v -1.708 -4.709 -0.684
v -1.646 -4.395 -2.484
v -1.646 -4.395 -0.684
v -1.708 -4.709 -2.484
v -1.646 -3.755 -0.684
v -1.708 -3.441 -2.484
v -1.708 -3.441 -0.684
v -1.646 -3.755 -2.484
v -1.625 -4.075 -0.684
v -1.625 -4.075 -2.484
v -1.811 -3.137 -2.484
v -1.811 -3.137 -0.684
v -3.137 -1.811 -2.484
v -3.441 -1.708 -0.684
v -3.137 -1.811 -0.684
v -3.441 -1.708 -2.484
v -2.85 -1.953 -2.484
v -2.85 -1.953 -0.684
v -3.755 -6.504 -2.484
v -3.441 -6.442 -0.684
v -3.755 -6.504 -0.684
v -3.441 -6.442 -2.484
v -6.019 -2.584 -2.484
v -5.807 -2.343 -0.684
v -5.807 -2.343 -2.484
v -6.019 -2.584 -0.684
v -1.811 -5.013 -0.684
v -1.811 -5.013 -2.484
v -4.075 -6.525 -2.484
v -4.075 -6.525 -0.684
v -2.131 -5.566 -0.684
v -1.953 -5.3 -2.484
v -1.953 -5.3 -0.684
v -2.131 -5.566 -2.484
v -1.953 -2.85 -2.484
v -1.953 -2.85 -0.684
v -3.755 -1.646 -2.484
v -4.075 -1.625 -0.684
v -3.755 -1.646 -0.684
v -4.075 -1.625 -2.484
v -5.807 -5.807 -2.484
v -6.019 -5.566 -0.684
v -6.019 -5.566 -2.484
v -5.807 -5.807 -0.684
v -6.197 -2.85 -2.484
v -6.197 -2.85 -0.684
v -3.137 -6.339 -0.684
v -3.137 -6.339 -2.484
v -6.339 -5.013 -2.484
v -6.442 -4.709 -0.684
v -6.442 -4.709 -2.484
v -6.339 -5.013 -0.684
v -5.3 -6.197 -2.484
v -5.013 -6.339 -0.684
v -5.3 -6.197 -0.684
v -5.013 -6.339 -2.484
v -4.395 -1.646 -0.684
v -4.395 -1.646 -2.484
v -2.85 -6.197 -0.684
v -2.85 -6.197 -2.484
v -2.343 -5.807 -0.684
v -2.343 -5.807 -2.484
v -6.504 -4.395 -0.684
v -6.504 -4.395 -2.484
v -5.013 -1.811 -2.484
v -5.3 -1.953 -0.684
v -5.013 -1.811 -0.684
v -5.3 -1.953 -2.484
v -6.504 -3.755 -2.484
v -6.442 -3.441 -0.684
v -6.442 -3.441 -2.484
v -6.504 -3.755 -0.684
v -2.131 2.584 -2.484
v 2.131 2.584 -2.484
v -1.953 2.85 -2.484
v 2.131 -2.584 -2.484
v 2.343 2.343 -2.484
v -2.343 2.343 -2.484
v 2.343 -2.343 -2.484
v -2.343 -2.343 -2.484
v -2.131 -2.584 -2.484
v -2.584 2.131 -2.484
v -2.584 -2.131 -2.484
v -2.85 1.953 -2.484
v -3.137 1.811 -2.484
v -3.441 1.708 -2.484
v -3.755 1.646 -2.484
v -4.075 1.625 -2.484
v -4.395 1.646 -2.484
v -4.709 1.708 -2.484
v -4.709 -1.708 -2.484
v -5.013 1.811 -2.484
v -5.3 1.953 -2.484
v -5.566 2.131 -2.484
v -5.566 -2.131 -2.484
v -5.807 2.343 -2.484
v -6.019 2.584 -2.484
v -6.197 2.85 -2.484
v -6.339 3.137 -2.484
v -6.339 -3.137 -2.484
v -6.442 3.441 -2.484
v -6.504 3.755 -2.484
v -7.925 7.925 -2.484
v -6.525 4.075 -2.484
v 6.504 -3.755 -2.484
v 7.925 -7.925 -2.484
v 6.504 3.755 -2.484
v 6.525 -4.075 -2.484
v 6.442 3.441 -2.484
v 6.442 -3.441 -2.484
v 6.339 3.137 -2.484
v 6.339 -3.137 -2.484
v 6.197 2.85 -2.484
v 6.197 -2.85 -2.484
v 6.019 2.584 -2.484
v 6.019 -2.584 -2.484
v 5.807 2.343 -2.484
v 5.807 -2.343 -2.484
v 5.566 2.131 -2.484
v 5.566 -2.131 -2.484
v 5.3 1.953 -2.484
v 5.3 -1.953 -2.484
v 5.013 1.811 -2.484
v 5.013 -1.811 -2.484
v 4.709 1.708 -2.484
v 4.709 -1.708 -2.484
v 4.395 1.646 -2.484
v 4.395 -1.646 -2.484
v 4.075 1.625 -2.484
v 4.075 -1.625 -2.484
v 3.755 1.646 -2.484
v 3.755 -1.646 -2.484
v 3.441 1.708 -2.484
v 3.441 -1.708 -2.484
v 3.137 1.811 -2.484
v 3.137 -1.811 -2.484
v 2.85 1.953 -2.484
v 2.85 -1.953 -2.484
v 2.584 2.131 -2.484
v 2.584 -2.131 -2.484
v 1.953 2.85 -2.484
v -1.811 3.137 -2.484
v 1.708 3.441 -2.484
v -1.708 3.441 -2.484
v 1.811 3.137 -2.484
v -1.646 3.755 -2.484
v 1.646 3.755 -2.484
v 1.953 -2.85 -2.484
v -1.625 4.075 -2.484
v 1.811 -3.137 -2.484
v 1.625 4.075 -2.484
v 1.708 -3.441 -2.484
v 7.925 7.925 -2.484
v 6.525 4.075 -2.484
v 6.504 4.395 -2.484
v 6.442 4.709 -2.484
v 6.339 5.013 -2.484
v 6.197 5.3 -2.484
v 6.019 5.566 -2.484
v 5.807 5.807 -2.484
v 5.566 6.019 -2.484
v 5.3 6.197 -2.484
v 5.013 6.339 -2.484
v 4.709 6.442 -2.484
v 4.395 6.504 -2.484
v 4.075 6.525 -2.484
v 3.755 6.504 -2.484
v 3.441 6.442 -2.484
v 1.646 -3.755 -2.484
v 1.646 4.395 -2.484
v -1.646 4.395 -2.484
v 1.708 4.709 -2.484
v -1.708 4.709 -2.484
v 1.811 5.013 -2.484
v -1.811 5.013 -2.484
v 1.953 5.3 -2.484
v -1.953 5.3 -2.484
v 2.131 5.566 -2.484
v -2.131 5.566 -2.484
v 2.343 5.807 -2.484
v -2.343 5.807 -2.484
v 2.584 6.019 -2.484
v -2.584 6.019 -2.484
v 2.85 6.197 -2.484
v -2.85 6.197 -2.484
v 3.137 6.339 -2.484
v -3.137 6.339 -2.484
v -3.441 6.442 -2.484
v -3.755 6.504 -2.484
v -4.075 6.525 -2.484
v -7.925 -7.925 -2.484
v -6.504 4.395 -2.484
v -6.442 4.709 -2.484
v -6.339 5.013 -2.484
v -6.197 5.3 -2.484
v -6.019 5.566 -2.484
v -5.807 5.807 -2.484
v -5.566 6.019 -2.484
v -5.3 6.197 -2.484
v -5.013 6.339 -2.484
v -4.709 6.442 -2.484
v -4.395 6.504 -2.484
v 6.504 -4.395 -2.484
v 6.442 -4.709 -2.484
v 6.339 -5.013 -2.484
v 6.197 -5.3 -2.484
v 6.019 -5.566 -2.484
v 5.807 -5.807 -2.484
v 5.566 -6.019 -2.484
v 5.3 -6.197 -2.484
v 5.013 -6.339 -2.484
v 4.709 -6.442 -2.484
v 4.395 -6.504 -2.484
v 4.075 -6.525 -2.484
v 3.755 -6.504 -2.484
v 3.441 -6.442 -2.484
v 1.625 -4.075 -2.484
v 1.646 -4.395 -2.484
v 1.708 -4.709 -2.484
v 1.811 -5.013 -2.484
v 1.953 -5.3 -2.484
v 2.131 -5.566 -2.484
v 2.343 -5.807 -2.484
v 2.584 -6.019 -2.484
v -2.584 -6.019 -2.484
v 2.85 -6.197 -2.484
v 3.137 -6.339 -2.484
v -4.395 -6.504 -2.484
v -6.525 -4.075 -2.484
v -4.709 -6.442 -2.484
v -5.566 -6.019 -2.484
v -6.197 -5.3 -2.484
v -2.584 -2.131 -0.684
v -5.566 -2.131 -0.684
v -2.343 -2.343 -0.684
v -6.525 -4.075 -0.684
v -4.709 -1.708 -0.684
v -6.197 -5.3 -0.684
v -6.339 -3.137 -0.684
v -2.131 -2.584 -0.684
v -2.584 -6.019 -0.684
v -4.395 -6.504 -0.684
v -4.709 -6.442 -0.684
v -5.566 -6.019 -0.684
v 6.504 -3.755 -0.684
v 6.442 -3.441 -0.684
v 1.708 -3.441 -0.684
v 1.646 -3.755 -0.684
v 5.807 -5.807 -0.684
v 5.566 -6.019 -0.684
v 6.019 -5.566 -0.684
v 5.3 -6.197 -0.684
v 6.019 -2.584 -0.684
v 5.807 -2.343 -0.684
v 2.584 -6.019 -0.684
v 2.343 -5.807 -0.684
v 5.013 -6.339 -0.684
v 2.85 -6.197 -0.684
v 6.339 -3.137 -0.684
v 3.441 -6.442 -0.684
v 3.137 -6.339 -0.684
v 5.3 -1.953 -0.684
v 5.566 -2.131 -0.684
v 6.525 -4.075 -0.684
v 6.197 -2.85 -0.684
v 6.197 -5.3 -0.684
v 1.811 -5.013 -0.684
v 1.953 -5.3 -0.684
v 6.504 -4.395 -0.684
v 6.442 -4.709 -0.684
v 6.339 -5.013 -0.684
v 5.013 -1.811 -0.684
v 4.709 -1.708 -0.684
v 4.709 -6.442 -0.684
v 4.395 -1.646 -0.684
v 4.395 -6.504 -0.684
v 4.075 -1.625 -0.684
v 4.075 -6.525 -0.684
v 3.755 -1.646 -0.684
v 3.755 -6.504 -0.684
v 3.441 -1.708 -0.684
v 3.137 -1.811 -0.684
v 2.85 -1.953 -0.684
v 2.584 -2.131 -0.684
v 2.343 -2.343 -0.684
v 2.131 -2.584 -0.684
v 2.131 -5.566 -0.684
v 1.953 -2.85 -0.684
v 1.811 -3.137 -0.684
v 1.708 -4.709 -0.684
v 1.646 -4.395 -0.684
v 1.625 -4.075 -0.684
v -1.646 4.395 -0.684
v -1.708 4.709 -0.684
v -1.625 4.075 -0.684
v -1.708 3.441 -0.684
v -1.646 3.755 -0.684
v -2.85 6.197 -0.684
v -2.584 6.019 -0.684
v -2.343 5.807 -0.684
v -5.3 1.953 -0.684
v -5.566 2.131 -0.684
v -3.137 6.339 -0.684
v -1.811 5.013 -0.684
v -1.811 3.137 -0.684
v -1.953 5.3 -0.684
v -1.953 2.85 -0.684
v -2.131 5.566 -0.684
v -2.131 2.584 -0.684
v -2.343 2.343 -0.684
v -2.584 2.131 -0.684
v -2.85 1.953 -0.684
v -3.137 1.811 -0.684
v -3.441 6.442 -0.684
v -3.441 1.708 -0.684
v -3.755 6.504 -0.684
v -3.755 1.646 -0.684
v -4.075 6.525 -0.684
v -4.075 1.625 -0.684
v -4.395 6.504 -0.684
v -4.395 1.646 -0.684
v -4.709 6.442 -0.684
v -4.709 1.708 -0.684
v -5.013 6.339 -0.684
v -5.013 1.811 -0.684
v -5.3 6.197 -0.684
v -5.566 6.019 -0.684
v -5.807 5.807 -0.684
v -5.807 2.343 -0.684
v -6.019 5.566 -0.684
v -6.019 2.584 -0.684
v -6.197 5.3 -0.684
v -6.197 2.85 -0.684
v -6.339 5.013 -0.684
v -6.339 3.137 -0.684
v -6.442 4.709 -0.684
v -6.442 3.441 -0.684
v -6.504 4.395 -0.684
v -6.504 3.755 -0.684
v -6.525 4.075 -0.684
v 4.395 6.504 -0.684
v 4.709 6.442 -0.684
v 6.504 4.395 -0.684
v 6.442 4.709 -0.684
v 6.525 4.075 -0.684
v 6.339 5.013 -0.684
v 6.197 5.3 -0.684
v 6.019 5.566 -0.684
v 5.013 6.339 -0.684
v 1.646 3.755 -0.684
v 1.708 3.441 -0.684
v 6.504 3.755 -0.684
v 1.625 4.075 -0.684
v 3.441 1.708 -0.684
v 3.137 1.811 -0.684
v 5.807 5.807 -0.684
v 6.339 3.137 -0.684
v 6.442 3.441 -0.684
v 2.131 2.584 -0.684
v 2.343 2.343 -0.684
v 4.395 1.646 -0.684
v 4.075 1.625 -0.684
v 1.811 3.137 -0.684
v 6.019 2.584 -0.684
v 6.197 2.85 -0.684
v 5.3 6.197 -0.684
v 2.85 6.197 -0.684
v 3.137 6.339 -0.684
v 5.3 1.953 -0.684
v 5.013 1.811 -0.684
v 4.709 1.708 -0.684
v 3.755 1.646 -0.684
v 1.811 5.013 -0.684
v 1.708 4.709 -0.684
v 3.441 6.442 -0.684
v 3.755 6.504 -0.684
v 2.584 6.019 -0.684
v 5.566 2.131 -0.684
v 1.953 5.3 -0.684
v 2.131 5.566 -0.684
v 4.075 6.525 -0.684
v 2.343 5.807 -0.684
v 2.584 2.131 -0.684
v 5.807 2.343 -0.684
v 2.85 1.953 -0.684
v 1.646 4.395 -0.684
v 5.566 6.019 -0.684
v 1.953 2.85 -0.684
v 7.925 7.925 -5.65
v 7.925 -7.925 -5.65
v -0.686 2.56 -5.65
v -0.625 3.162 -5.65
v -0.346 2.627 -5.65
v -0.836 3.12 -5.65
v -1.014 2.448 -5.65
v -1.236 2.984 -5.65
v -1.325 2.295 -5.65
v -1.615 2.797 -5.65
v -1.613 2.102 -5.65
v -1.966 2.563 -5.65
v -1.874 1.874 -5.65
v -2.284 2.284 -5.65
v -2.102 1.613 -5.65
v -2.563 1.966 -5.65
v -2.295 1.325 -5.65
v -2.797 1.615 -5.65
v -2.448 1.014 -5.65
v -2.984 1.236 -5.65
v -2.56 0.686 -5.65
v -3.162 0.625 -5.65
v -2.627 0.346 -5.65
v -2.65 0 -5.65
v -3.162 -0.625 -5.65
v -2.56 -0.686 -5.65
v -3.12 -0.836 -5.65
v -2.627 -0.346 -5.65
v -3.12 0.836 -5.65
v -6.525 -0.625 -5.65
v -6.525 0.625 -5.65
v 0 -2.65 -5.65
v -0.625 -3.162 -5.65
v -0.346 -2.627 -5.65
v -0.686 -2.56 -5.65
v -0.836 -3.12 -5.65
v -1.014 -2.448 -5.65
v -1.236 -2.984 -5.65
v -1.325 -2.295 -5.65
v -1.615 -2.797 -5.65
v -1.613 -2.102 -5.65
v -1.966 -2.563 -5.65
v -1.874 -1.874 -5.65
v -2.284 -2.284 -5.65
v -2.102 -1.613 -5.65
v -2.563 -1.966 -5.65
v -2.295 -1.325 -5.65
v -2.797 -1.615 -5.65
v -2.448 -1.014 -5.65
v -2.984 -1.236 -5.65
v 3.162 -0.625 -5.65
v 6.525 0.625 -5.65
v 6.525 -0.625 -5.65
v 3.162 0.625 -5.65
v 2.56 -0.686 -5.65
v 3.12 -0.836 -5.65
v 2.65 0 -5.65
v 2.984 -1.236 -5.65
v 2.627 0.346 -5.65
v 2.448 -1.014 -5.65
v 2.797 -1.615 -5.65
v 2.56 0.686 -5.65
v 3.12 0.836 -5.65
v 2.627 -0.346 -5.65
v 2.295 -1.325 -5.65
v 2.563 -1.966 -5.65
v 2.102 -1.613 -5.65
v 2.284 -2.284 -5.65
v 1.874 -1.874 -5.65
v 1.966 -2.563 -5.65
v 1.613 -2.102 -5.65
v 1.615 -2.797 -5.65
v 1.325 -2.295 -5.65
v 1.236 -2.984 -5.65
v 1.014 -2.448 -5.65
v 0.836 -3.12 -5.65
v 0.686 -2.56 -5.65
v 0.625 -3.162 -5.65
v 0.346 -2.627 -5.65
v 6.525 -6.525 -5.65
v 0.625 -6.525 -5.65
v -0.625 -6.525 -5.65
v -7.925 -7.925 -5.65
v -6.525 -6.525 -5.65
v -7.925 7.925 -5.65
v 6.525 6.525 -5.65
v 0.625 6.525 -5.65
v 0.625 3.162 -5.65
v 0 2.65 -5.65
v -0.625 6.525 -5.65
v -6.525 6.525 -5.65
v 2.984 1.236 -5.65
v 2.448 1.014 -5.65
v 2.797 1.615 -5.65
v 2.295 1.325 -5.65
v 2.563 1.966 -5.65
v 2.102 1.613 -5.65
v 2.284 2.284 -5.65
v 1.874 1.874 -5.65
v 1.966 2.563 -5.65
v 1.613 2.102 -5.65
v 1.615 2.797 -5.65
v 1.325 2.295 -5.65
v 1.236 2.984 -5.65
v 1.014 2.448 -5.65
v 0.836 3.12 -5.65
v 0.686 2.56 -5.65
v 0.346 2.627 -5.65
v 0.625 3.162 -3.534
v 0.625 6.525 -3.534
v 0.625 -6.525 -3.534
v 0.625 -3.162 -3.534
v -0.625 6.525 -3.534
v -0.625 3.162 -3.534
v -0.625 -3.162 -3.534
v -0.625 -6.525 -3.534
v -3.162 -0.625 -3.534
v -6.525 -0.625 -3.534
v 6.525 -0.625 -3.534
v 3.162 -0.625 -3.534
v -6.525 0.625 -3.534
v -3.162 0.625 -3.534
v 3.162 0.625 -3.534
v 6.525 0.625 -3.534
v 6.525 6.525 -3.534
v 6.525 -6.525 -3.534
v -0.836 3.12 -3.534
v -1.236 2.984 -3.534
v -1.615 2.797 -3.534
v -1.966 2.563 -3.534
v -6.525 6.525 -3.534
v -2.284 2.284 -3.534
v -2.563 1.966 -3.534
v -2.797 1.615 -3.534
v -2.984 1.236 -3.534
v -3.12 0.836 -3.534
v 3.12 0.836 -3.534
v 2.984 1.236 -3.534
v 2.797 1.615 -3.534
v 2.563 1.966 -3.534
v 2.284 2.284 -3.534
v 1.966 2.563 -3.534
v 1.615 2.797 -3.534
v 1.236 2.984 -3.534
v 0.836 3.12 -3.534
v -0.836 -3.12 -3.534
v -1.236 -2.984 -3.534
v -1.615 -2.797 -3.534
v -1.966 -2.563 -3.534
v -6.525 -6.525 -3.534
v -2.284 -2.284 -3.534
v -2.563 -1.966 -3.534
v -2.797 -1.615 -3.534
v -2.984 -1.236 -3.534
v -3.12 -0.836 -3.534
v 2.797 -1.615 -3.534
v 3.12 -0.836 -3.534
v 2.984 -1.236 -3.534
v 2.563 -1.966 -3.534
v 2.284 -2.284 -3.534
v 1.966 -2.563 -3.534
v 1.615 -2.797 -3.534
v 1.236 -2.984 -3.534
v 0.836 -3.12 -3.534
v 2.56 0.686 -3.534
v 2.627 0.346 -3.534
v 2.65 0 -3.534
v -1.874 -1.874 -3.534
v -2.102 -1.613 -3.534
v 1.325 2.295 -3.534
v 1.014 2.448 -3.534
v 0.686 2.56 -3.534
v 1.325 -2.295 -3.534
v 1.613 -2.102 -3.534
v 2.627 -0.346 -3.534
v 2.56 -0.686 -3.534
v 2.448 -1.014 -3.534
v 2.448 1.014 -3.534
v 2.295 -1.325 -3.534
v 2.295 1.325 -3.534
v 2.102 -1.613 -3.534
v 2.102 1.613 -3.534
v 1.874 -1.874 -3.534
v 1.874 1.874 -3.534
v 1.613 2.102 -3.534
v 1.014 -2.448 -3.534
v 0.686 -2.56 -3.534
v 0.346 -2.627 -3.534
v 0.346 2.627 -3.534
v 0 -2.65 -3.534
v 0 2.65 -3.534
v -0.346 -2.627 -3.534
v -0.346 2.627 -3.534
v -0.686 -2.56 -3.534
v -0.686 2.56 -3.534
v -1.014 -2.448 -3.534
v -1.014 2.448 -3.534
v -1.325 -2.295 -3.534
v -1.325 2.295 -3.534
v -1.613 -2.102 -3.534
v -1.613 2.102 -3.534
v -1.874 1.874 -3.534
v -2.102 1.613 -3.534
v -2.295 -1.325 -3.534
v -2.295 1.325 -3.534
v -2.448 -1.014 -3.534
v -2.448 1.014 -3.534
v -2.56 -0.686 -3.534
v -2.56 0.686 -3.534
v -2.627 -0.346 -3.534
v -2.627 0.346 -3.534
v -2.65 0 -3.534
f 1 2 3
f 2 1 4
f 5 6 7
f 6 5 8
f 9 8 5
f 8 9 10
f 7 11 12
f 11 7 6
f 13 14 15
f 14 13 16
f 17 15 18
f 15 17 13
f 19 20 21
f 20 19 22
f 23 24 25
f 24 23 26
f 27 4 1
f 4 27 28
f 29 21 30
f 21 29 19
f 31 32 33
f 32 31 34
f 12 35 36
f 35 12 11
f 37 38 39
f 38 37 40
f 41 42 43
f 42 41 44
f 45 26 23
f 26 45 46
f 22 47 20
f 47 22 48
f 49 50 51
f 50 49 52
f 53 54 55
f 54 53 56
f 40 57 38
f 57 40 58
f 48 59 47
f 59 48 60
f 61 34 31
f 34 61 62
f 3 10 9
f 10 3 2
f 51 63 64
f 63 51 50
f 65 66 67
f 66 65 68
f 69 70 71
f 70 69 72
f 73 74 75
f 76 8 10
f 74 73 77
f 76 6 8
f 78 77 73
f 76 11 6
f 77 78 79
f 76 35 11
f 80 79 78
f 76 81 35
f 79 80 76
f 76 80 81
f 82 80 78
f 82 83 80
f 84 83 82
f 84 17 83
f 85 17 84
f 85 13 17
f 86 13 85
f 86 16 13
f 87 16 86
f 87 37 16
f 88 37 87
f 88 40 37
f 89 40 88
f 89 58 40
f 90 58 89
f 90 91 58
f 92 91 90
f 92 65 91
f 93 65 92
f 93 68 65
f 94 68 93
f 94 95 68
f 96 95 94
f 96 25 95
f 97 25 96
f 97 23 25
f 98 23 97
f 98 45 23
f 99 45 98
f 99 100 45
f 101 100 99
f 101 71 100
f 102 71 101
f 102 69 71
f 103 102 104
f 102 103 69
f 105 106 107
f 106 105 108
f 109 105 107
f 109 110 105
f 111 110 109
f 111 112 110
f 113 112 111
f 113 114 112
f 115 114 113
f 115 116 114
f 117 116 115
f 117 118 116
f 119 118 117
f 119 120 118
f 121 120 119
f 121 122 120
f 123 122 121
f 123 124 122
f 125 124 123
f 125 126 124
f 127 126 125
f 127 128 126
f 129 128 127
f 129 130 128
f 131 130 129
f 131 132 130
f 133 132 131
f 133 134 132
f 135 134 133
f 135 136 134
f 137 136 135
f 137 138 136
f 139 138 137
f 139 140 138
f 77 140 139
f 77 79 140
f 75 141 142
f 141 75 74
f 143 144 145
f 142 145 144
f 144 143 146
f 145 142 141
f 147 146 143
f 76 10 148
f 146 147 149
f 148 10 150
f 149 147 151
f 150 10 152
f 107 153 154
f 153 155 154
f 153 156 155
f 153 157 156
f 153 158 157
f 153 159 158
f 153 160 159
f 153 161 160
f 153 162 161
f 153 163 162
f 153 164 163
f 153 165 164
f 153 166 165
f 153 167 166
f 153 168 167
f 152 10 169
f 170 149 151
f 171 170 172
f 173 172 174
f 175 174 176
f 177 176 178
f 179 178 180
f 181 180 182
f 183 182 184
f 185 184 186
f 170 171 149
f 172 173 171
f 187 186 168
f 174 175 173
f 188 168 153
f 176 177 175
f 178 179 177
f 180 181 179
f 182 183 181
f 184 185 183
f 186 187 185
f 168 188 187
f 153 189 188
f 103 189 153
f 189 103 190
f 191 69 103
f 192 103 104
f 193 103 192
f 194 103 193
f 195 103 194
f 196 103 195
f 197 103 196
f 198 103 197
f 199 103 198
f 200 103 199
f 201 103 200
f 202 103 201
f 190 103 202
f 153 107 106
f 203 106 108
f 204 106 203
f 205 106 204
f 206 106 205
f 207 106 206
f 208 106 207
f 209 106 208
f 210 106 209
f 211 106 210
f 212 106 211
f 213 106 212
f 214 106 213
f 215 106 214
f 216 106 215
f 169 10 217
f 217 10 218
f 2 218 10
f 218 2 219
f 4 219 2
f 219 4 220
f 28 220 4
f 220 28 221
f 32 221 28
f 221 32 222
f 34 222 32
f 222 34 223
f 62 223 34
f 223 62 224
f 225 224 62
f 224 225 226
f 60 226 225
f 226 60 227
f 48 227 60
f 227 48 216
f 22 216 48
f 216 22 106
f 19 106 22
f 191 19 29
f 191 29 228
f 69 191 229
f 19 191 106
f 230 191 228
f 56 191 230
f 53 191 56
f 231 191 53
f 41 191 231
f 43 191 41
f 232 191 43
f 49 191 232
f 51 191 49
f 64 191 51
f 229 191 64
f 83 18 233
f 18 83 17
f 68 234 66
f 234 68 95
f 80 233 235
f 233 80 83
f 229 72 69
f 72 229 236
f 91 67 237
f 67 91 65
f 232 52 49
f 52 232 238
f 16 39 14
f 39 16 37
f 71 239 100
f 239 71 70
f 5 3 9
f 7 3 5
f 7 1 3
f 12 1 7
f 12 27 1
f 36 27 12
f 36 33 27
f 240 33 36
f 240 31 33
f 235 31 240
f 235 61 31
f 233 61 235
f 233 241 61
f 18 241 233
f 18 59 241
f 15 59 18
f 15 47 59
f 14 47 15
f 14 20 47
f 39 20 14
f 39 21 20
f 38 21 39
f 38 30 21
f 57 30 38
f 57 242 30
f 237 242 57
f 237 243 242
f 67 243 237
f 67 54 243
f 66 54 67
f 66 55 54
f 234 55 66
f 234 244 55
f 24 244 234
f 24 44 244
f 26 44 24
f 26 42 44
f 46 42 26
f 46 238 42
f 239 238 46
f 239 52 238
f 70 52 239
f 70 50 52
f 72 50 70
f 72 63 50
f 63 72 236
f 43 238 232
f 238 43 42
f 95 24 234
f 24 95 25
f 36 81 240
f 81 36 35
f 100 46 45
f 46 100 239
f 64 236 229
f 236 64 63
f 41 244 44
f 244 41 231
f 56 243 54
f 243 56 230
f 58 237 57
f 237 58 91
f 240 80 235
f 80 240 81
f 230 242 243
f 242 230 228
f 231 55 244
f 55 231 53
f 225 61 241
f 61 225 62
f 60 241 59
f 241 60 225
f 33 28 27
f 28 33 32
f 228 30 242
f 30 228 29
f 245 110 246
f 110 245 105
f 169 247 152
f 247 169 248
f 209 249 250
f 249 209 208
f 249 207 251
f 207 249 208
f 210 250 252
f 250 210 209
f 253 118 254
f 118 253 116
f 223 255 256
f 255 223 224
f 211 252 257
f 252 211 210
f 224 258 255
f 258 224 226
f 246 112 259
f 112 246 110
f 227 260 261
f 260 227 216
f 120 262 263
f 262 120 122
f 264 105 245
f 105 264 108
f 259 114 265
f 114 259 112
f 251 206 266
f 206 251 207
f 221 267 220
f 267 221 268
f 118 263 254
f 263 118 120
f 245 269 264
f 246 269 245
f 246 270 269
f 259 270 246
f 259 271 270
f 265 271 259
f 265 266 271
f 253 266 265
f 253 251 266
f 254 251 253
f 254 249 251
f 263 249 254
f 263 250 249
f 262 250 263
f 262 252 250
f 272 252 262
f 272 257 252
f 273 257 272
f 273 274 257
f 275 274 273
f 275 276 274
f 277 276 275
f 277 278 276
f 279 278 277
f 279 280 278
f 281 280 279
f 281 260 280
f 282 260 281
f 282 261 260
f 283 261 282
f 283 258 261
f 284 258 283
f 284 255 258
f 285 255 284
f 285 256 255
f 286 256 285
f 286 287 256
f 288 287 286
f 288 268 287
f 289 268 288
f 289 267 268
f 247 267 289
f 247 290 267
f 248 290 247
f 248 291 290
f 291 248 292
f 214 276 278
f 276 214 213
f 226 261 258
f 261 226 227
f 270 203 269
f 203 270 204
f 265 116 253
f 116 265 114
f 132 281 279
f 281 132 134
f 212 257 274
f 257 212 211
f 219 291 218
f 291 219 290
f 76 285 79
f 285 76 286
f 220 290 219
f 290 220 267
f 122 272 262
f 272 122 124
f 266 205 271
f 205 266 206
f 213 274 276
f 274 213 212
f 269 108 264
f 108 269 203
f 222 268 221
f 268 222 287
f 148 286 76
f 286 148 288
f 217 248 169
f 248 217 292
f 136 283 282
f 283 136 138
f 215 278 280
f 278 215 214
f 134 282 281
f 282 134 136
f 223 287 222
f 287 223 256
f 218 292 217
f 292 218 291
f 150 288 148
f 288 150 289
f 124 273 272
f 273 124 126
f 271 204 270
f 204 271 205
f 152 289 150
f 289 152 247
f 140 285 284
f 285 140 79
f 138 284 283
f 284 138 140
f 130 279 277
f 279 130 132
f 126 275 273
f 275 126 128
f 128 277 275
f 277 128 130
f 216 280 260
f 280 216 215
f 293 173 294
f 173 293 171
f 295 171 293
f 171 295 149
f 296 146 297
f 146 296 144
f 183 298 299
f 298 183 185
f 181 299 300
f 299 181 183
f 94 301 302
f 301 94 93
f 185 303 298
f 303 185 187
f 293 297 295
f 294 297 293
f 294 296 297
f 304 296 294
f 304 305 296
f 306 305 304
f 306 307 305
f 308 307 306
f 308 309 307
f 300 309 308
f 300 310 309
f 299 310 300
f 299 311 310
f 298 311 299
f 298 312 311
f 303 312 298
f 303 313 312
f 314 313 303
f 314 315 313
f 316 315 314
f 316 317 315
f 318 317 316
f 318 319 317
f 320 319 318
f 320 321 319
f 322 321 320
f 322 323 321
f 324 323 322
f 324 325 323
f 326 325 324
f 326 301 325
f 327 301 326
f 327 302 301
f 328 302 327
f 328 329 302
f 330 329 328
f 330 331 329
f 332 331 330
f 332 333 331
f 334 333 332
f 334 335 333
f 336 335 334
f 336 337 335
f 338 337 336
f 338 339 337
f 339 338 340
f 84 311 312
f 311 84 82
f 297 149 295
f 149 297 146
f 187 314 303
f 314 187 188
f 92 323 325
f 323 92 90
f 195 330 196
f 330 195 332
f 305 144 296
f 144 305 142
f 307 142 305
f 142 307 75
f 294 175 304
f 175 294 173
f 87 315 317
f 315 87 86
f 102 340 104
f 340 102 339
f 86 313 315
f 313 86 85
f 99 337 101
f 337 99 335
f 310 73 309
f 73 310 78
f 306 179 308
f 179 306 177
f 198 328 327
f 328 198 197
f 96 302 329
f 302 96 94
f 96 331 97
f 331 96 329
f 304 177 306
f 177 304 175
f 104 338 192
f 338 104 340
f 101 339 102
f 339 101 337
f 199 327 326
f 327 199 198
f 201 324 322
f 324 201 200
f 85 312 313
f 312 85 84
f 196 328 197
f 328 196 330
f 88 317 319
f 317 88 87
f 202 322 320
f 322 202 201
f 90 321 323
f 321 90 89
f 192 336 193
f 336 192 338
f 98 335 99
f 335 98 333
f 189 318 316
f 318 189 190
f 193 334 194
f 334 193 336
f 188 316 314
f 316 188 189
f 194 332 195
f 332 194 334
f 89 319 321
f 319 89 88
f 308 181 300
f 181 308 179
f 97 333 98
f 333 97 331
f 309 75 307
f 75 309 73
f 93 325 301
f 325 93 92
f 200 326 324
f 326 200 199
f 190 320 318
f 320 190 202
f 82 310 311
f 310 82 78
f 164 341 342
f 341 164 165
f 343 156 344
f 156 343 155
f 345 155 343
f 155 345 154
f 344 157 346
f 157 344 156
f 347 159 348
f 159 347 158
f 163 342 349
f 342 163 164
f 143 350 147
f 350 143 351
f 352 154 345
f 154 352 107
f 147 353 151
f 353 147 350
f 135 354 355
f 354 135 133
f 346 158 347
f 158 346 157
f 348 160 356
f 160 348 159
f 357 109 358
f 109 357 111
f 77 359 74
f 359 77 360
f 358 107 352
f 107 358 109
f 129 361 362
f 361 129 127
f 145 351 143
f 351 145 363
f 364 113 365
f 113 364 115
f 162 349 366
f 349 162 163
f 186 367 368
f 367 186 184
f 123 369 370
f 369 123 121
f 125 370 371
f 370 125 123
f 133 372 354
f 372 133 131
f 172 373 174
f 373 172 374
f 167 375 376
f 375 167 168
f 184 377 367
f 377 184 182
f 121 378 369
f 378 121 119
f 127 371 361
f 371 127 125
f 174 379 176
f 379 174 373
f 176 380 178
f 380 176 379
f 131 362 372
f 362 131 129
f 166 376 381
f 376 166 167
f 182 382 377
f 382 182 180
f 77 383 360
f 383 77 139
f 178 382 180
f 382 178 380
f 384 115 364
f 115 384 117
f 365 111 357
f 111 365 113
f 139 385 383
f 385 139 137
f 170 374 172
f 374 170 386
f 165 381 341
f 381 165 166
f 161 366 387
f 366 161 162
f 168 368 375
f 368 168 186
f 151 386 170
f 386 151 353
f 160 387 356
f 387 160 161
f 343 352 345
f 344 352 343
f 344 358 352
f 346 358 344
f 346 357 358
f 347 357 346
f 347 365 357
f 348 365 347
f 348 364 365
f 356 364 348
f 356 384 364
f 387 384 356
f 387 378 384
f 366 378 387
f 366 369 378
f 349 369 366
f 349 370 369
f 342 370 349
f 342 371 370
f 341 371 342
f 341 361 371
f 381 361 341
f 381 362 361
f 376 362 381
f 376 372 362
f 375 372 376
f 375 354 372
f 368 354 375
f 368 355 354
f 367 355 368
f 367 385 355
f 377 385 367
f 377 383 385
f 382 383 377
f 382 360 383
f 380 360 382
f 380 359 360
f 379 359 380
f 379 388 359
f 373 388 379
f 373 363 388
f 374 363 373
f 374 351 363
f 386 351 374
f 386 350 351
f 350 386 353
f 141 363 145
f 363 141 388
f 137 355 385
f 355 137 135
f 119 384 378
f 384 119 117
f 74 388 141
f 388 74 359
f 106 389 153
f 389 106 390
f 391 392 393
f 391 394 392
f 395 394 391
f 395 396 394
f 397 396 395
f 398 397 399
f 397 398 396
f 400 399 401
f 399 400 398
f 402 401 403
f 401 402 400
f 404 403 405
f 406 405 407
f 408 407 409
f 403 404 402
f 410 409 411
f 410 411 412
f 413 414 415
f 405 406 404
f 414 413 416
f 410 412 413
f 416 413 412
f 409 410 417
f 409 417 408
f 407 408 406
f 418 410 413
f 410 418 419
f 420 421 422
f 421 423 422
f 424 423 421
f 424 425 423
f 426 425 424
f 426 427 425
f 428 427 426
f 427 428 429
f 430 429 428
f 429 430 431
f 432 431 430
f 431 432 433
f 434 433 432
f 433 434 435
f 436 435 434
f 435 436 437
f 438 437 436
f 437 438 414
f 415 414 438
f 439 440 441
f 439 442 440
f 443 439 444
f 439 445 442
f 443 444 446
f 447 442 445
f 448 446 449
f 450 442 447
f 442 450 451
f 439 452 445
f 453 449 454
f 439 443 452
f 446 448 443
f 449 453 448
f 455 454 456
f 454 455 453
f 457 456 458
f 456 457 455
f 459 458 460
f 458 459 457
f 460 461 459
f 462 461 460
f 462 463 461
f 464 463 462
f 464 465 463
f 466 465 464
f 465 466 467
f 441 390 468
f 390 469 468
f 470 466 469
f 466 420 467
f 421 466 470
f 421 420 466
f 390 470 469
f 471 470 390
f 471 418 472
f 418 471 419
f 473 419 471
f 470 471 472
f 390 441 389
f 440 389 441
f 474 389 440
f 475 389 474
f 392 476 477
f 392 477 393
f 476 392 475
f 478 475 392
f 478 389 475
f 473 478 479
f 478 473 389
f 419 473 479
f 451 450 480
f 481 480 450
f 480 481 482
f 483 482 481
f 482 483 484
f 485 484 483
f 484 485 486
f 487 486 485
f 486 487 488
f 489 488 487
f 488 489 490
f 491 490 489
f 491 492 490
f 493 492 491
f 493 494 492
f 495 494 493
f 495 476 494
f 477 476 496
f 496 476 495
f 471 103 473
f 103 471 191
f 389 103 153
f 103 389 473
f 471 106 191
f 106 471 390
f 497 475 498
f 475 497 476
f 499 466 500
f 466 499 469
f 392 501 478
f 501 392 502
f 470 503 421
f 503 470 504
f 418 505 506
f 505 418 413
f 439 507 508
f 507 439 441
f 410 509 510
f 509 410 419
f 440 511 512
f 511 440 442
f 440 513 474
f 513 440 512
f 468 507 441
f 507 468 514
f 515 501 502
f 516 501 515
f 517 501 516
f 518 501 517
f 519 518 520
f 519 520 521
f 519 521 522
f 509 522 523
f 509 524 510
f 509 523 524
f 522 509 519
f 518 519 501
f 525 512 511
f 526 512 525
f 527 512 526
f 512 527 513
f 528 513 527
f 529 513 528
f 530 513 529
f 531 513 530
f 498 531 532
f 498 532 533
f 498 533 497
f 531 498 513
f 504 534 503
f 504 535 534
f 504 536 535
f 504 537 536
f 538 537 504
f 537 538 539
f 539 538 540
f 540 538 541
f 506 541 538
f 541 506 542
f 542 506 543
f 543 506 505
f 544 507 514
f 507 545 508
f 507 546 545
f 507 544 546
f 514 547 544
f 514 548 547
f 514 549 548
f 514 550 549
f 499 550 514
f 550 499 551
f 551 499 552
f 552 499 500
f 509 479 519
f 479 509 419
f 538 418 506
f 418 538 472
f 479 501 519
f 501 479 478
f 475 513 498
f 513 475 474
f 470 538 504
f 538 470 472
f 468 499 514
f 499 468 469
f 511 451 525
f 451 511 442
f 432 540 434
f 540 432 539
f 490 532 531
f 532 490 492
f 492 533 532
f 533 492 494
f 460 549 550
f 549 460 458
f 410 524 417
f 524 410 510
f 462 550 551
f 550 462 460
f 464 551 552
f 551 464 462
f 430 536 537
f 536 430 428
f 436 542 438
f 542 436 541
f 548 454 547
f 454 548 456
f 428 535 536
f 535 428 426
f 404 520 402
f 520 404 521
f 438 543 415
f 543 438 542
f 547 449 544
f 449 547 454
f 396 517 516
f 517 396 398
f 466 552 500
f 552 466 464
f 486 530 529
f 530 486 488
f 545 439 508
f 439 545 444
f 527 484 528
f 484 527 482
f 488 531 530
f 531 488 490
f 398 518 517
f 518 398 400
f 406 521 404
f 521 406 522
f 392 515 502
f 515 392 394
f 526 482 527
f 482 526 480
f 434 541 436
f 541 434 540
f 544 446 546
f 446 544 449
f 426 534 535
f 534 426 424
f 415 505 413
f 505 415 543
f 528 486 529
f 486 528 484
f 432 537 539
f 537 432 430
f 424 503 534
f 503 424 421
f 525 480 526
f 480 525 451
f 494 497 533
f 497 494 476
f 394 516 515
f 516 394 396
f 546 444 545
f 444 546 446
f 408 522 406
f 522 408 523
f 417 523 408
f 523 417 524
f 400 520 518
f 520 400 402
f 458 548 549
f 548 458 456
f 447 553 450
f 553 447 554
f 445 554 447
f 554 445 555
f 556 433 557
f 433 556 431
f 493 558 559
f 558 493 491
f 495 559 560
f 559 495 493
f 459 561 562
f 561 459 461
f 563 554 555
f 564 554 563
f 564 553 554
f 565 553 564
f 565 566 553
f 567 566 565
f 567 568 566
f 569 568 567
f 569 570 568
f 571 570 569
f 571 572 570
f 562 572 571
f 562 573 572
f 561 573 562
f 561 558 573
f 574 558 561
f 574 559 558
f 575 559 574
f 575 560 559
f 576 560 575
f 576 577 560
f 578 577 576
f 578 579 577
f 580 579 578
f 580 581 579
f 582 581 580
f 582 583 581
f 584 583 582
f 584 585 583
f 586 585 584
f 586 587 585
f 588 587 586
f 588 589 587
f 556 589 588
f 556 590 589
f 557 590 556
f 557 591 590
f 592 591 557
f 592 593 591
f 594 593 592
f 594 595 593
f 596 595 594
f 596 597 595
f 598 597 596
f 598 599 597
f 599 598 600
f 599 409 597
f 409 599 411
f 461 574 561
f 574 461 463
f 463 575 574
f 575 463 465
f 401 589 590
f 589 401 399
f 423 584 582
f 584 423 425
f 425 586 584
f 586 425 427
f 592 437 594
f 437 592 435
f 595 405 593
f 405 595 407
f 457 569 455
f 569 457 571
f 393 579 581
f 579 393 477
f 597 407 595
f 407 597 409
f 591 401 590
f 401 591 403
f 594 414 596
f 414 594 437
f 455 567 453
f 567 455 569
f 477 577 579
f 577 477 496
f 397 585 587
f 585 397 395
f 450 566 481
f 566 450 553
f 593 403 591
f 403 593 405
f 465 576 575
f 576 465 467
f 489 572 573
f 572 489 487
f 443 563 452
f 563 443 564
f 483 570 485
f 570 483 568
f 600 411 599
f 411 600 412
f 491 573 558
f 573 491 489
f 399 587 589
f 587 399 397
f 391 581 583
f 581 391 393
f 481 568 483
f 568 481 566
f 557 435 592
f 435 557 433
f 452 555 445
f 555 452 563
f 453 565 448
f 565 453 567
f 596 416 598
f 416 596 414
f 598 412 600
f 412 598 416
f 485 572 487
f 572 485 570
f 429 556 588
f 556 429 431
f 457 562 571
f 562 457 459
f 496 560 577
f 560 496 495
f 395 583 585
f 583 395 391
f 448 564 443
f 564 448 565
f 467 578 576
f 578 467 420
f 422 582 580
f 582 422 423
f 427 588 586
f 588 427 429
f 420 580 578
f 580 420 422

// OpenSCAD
// file: lego.scad
// edited 2/24/11 3:29 PM

// Standard lego block height, from bottom to top, not counting the circular knobs on top
block_height=9.5;
block_smooth=0.8;

// Exterior thickness
wall_thickness=1.40; //1.45
roof_thickness=1.05;

// Knobs are the circles on top of blocks
knob_diameter=4.9; //4.8
knob_height=1.8;
knob_spacing=8.15; //8.0

// Pins are small cylinders inside blocks with width or length of 1 (visible from the bottom)
pin_diameter=3;

// Posts are the tubes inside blocks with width and length > 1 (visible from the bottom)
post_diameter=6.46; //6.46
post_fudge=0.2; // 0.05 Additional diameter for cylinder that makes the post hollow

// Width of reinforcement bars (visible from the bottom)
reinforcing_width=1.25;

// Axles are cross-shaped holes taken out of lego blocks
axle_spline_width=2.0;
axle_diameter=5;

// Cylinder precision affects both posts and pins
cylinder_precision=0.3;

// The "reinforcement" is the inner wall that goes from post to post, or post to outer wall
module reinforcement(overall_width,height) {
	translate([0,0,height*block_height/2])
		cube([reinforcing_width,overall_width,height*block_height],center=true);
}

// An "axle" is an optional cross-shaped hole that cuts through the lego block
module axle(height) {
	translate([0,0,height*block_height/2]) union() {
		cube([axle_diameter,axle_spline_width,height*block_height],center=true);
		cube([axle_spline_width,axle_diameter,height*block_height],center=true);
	}
}

module lego_knobs(width, length, centerx=0, centery=0, centerz=0) {
	overall_length=(length-1)*knob_spacing+knob_diameter+wall_thickness*2;
	overall_width=(width-1)*knob_spacing+knob_diameter+wall_thickness*2;
	translate([-overall_length/2*centerx, -overall_width/2*centery, -(block_height+knob_height)/2]) {
		translate([knob_diameter/2+wall_thickness,knob_diameter/2+wall_thickness,0]) {
			for (ycount=[0:width-1]) {
				for (xcount=[0:length-1]) {
					translate([xcount*knob_spacing,ycount*knob_spacing,0])
						cylinder(r=knob_diameter/2,h=knob_height,$fs=cylinder_precision);
				}
			}
		}
	}	
}

// The 'positive space' of a lego block
module lego_positive(width, length, height, reinforcement=true, centerx=0, centery=0, centerz=0) {
	overall_length=(length-1)*knob_spacing+knob_diameter+wall_thickness*2;
	overall_width=(width-1)*knob_spacing+knob_diameter+wall_thickness*2;
	translate([-overall_length/2*centerx, -overall_width/2*centery, -(block_height+knob_height)/2]) {
		union() {
			cube([overall_length,overall_width,height*block_height]);
			// minkowski() {
			// 	translate([block_smooth, block_smooth, block_smooth])
			// 		cube([overall_length-block_smooth*2,overall_width-block_smooth*2,height*block_height-block_smooth*2]);
			// 	sphere(r=block_smooth, $fn=16);
			// }
			translate([knob_diameter/2+wall_thickness,knob_diameter/2+wall_thickness,0]) {
				for (ycount=[0:width-1]) {
					for (xcount=[0:length-1]) {
						translate([xcount*knob_spacing,ycount*knob_spacing,block_height*height])
							cylinder(r=knob_diameter/2,h=knob_height,$fs=cylinder_precision);
					}
				}
			}
		}
	}
}

// The 'negative space' of a lego block
module lego_negative(width, length, height, axle_hole=false, reinforcement=true, centerx=0, centery=0, centerz=0) {
	overall_length=(length-1)*knob_spacing+knob_diameter+wall_thickness*2;
	overall_width=(width-1)*knob_spacing+knob_diameter+wall_thickness*2;
	translate([-overall_length/2*centerx, -overall_width/2*centery, -(block_height+knob_height)/2]) {
		union() {
			if (axle_hole==true && width>1 && length>1)
				for (ycount=[0:width-1])
					for (xcount=[0:length-1])
						translate([xcount*knob_spacing,ycount*knob_spacing,0])
							axle(height);
			difference() {
				// Hollow out the block by creating an inner block up to the walls and roof of the brick
				translate([wall_thickness,wall_thickness,0])
					cube([overall_length-wall_thickness*2,overall_width-wall_thickness*2,block_height*height-roof_thickness]);
				if (reinforcement==true && width>1 && length>1) {
					translate([0,0,0]) {
						for (ycount=[0:width-2]) {
							for (xcount=[0:length-2]) {
								translate([xcount*knob_spacing+((knob_spacing+knob_diameter)/2+wall_thickness), ycount*knob_spacing+((knob_spacing+knob_diameter)/2+wall_thickness), 0]) {
									rotate([0,0,0])
										reinforcement(overall_length, height);
									rotate([0,0,90])
										reinforcement(overall_width, height);
								}
							}
							// translate([overall_width/2, ycount*knob_spacing+((knob_spacing+knob_diameter)/2+wall_thickness), 0])
						}
					}
				}
				// Remove center cylinder for post
				if (width>1 && length>1)
					for (ycount=[0:width-2])
						for (xcount=[0:length-2])
							translate([
								xcount*knob_spacing+((knob_spacing+knob_diameter)/2+wall_thickness),
								ycount*knob_spacing+((knob_spacing+knob_diameter)/2+wall_thickness),0])
								cylinder(r=post_diameter/2, h=height*block_height,$fs=cylinder_precision);
				if (width==1 && length!=1)
					for (xcount=[0:length-2])
						translate([xcount*knob_spacing+((knob_spacing+knob_diameter)/2+wall_thickness),overall_width/2,0])
							cylinder(r=pin_diameter/2,h=block_height*height,$fs=cylinder_precision);
				if (length==1 && width!=1)
					for (ycount=[0:width-2])
						translate([overall_length/2,ycount*knob_spacing+((knob_spacing+knob_diameter)/2+wall_thickness),0])
							cylinder(r=pin_diameter/2,h=block_height*height,$fs=cylinder_precision);
			}

			// Add inner cylinder for post back
			if (width>1 && length>1)
				for (ycount=[0:width-2])
					for (xcount=[0:length-2])
						translate([
							xcount*knob_spacing+((knob_spacing+knob_diameter)/2+wall_thickness),
							ycount*knob_spacing+((knob_spacing+knob_diameter)/2+wall_thickness),0])
							cylinder(r=knob_diameter/2+post_fudge, h=height*block_height-roof_thickness,$fs=cylinder_precision);
		}
	}
}

module lego(width, length, height, axle_hole=false, reinforcement=true, centerx=0, centery=0, centerz=0) {
	difference() {
		lego_positive(width, length, height, reinforcement, centerx, centery, centerz);
		lego_negative(width, length, height, axle_hole, reinforcement, centerx, centery, centerz);
	}
}

scale([2.0,2.0,2.0])
	lego(2,2,1/3);
// main file
use <lego.scad>

$fn=48;

lego(2,2,0.3333,axle_hole=false,reinforcement=true,centerx=1,centery=1);

// Check to see if the knobs fit snugly inside
// lego_knobs(2,2,centerx=1,centery=1);
